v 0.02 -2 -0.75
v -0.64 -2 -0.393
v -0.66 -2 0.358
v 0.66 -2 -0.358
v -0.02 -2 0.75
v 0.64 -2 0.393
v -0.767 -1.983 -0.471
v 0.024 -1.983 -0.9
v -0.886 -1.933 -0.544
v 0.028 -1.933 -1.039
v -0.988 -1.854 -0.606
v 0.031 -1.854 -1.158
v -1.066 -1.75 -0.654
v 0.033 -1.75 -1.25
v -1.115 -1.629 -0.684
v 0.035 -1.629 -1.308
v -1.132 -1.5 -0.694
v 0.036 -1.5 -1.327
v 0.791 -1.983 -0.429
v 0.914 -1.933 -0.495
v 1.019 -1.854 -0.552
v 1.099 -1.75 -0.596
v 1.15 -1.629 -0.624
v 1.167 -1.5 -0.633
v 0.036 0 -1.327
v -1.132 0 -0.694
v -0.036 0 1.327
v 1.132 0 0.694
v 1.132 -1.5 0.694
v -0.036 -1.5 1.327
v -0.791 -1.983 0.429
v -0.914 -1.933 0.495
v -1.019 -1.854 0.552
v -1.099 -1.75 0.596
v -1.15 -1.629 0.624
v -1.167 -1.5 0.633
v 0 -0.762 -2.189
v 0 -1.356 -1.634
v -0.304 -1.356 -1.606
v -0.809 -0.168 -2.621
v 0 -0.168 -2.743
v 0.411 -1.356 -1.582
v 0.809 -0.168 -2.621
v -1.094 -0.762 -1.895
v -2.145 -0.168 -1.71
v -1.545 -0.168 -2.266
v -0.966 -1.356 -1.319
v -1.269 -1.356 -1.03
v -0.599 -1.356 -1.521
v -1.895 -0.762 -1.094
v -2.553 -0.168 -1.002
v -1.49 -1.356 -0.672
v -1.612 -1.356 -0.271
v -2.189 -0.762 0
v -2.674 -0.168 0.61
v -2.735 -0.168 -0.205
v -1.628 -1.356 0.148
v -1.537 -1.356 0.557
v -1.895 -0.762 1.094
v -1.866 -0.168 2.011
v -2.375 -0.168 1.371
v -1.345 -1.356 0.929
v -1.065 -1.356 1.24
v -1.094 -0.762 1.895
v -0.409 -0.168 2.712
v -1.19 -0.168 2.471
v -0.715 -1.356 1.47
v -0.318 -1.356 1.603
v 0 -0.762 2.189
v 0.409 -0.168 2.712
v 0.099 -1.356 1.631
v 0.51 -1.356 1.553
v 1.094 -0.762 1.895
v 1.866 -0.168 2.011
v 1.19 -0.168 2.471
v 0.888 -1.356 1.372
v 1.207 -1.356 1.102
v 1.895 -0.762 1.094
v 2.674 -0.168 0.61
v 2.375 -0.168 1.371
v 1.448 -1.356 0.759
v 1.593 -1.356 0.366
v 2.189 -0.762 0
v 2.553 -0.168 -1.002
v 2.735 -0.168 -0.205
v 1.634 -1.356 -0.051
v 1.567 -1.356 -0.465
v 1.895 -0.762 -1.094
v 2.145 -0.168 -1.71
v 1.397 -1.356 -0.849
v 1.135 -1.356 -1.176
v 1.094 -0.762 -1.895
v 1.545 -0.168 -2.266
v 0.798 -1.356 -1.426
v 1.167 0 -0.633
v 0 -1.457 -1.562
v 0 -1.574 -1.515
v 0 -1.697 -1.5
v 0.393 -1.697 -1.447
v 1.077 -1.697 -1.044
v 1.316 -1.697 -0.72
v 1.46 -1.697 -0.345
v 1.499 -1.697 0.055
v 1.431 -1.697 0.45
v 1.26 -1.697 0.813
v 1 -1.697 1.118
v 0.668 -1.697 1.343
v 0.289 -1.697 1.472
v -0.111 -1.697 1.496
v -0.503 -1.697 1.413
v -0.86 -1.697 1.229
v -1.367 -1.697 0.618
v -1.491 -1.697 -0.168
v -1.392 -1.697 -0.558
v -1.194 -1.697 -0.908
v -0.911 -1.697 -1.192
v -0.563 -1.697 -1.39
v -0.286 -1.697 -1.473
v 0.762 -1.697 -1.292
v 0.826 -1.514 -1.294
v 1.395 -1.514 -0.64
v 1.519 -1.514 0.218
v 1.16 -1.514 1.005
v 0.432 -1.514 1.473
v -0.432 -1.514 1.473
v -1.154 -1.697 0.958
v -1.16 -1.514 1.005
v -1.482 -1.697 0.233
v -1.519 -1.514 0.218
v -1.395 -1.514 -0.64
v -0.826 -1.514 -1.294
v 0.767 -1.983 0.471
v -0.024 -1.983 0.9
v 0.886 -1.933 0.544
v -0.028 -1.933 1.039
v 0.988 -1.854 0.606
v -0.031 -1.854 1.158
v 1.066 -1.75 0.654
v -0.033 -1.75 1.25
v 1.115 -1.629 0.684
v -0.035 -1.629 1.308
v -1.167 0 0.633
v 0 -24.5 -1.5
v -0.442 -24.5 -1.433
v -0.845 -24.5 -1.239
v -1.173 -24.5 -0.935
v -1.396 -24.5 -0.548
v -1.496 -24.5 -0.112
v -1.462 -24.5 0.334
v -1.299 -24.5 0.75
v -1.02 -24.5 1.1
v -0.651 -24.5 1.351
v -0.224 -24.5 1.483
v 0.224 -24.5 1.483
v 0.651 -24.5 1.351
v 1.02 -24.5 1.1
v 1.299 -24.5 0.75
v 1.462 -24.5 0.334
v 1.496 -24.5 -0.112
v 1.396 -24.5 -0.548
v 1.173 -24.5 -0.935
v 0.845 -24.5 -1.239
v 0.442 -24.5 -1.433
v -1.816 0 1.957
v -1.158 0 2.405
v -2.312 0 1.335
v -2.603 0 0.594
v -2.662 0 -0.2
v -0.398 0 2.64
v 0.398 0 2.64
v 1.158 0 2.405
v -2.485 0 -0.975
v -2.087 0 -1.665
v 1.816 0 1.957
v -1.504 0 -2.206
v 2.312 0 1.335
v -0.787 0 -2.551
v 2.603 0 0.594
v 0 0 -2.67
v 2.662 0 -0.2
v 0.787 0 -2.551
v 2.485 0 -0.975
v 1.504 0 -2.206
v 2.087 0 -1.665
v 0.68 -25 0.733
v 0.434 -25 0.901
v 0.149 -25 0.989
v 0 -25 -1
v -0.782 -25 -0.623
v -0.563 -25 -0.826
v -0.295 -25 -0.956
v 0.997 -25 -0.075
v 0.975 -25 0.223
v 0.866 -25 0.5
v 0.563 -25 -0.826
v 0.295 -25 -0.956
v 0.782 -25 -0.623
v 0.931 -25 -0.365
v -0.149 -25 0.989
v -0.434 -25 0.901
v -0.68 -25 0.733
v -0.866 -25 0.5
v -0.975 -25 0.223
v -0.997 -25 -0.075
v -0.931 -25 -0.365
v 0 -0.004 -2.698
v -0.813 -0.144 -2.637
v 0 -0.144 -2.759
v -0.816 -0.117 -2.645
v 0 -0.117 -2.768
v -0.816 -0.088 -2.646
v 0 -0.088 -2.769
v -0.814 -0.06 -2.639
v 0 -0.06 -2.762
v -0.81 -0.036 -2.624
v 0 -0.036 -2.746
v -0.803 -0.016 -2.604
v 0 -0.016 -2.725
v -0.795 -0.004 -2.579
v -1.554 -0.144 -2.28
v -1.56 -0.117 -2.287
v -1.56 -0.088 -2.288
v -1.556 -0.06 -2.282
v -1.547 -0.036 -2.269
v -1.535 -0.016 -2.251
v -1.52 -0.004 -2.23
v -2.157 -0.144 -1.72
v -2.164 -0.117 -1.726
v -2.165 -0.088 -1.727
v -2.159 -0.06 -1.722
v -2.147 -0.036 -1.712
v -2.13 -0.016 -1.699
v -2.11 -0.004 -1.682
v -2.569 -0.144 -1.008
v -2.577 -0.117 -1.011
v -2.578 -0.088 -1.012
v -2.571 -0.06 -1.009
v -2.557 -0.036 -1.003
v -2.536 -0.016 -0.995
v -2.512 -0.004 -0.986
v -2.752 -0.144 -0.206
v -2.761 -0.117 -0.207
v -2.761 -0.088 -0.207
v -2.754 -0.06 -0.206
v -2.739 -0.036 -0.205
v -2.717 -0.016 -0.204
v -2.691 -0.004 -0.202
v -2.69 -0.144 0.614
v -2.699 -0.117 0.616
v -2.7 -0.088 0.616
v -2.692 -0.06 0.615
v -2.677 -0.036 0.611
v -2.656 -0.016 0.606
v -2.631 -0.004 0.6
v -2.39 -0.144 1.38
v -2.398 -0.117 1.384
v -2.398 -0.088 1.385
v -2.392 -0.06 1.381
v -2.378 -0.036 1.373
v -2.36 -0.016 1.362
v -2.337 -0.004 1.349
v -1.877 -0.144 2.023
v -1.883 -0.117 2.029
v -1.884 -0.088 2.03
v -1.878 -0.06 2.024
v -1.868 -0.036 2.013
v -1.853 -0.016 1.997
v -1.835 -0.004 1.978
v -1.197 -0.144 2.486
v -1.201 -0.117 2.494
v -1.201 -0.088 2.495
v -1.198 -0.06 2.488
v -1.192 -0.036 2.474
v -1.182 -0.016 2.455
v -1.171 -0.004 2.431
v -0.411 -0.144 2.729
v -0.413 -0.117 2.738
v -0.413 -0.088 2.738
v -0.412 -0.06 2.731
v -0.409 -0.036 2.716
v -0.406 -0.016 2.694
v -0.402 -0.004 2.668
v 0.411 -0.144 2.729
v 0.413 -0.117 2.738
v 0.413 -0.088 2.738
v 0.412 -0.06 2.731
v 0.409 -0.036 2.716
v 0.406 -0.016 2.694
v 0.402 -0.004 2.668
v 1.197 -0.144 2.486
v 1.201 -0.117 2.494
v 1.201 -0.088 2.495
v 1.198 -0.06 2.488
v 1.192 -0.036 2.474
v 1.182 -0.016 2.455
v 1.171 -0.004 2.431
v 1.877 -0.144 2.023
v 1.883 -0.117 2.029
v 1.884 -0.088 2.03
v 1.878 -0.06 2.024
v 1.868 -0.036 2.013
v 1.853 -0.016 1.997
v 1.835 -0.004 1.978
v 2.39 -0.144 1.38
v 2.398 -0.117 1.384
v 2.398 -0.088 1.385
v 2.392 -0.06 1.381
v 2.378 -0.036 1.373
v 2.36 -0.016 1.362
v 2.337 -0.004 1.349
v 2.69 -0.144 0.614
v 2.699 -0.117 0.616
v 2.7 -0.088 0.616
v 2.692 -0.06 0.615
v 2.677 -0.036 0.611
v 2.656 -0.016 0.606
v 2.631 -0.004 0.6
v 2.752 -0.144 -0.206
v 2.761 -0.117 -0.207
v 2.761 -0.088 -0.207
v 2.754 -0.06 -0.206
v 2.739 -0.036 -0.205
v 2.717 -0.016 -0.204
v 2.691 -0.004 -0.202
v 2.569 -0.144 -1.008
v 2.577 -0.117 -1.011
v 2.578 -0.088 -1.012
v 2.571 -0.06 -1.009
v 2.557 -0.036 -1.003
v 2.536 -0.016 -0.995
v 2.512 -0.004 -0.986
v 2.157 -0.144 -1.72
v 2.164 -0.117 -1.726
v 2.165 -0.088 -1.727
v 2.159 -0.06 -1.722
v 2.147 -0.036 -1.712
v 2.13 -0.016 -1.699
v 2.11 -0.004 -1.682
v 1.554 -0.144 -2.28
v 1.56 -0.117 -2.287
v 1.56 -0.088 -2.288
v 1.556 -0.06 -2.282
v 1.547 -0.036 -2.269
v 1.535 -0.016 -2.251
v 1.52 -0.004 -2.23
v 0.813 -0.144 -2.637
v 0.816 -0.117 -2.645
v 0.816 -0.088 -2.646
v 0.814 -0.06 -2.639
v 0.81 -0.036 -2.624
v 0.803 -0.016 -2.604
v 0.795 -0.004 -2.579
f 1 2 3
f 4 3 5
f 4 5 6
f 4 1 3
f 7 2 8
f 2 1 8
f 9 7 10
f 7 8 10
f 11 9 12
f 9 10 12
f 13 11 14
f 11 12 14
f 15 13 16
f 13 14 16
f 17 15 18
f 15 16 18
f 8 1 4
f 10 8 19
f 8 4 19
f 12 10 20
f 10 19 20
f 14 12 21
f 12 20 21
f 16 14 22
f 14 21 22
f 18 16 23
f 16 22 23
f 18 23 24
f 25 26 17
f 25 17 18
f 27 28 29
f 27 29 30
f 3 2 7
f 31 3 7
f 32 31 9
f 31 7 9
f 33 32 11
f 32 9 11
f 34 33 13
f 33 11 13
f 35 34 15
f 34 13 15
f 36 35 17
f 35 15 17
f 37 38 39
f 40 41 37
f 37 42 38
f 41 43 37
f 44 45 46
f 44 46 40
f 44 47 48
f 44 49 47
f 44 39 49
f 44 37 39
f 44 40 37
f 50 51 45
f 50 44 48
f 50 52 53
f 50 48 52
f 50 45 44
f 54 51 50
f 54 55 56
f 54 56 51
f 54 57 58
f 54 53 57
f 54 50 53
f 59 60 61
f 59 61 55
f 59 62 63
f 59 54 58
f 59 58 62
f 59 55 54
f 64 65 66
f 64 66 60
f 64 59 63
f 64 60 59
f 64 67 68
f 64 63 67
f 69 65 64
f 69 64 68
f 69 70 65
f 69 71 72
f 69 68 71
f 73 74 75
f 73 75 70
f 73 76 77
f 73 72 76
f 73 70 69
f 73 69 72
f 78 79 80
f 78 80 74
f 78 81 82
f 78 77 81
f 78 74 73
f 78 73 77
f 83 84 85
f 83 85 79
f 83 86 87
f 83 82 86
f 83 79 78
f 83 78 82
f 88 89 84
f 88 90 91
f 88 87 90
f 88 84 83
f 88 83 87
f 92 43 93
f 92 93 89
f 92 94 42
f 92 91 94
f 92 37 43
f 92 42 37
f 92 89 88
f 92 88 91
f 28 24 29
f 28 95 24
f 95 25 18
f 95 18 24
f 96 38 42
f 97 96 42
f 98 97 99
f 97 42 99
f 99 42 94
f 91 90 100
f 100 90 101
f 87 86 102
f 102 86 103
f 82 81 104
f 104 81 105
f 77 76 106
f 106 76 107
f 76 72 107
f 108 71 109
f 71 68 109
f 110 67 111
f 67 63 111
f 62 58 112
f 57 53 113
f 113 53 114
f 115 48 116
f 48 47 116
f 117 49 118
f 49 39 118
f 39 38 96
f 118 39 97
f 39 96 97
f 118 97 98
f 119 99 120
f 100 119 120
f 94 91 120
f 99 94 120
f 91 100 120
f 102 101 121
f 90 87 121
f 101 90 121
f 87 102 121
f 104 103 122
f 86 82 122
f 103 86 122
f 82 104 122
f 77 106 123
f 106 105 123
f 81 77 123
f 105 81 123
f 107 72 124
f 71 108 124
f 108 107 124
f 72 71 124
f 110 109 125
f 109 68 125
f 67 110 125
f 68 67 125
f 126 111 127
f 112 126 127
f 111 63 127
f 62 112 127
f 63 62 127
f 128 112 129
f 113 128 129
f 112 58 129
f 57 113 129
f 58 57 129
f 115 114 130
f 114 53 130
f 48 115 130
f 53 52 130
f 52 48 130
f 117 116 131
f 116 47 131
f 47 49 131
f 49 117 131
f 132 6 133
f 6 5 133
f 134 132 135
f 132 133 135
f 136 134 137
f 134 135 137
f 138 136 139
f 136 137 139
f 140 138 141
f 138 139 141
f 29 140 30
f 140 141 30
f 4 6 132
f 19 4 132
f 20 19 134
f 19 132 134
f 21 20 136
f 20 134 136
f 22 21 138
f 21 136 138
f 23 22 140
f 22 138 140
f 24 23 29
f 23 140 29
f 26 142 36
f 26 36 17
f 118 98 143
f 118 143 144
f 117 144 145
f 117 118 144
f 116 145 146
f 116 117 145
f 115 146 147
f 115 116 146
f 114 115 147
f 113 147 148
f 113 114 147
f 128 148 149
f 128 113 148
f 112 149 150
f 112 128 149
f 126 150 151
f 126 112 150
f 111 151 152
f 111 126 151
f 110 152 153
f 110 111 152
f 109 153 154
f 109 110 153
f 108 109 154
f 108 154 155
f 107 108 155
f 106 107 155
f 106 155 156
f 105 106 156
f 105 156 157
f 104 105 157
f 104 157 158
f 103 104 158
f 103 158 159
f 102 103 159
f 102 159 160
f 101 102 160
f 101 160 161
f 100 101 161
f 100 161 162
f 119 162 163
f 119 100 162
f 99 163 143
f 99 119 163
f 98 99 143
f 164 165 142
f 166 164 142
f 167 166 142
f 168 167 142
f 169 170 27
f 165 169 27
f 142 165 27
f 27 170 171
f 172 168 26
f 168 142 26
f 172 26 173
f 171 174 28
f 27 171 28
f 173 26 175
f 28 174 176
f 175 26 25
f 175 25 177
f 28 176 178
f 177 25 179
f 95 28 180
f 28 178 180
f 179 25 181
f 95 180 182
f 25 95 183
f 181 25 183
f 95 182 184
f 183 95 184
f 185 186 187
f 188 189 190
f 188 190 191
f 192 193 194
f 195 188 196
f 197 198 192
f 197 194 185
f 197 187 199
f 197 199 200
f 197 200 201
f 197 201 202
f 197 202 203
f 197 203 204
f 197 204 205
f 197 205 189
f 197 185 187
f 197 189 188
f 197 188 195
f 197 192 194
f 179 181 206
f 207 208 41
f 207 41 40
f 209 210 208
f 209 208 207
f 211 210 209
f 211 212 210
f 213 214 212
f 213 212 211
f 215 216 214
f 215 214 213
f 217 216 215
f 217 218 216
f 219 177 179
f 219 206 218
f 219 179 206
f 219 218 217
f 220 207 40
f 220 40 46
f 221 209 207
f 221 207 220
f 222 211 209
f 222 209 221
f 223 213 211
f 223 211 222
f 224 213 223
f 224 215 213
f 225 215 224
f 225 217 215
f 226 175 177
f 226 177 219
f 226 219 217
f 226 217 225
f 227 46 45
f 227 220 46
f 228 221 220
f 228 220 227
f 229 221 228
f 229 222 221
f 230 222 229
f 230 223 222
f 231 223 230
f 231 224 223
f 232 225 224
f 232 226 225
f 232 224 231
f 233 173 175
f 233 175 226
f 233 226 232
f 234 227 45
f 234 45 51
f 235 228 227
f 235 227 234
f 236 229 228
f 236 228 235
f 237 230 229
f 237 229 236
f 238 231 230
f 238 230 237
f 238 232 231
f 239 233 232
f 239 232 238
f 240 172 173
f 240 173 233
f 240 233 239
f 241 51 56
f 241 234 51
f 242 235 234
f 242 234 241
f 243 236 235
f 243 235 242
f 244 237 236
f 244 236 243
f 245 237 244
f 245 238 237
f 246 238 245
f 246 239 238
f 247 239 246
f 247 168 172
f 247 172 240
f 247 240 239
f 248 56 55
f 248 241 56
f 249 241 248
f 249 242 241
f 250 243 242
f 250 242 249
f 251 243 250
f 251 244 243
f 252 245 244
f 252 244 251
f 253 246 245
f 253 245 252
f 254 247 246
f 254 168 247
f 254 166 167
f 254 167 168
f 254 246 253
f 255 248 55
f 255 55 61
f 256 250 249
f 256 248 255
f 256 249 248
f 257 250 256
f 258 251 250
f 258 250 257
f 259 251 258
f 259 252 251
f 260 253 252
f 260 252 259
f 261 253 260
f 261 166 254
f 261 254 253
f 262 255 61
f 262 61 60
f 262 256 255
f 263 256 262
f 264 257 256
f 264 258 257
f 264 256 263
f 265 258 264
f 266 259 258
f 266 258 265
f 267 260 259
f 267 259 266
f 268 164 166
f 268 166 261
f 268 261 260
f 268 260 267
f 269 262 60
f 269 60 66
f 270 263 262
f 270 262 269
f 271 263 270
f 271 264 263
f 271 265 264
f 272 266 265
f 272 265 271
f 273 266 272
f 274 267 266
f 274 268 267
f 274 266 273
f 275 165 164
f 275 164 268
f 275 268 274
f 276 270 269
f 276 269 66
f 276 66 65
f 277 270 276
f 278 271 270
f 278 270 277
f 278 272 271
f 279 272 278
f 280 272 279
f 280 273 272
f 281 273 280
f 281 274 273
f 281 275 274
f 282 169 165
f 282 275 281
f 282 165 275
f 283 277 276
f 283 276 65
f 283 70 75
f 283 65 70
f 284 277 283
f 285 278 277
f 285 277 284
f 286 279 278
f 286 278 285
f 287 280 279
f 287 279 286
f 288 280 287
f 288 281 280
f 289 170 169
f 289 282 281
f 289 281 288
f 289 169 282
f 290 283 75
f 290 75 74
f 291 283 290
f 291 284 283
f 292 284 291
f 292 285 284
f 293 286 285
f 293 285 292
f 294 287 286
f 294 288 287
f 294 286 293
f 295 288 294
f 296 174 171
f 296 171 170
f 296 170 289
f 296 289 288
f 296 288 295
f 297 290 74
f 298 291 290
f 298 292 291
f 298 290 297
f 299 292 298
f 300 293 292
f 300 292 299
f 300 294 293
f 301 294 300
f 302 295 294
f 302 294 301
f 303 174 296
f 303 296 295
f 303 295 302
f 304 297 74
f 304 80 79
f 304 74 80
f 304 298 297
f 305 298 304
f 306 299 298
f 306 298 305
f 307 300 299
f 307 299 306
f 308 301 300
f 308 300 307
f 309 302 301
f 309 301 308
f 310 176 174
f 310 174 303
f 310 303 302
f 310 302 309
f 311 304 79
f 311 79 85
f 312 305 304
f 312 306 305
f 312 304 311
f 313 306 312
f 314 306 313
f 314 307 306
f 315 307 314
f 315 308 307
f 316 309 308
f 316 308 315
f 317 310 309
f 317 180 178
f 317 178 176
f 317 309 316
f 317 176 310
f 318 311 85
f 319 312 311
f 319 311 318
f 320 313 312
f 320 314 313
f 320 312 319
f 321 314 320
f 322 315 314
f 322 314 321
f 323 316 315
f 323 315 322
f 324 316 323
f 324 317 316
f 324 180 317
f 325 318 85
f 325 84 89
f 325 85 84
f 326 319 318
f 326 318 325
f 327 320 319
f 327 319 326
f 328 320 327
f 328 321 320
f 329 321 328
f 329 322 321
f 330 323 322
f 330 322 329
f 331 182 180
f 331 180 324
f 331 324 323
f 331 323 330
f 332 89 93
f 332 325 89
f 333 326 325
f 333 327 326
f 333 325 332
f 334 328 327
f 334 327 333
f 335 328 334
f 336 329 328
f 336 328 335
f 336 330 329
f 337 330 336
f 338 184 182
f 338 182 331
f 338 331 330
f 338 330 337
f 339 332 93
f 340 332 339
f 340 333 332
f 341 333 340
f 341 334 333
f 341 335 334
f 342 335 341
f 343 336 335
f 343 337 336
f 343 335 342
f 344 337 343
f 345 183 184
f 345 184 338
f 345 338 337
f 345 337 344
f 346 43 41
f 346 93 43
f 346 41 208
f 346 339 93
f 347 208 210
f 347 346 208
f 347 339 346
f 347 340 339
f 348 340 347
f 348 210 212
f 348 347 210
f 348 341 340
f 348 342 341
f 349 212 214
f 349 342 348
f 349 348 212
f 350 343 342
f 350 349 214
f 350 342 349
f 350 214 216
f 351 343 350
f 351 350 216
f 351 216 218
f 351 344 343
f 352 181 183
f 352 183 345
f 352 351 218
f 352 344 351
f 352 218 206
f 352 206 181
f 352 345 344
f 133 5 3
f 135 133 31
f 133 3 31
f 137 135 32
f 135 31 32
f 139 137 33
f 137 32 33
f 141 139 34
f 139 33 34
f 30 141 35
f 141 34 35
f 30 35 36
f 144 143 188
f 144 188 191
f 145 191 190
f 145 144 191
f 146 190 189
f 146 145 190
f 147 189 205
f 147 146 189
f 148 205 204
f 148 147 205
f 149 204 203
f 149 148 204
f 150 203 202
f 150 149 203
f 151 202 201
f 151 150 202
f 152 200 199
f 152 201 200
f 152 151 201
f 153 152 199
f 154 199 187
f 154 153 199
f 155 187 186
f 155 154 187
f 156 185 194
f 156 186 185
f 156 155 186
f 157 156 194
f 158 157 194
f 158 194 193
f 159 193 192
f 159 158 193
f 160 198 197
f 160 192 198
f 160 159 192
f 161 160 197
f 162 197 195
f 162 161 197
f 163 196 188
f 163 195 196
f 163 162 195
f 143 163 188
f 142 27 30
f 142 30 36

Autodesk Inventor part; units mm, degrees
ref_plane "YZ Plane" through (0, 0, 0) normal (1, 0, 0) x (0, 1, 0)
ref_plane "XZ Plane" through (0, 0, 0) normal (0, 1, 0) x (-1, 0, 0)
ref_plane "XY Plane" through (0, 0, 0) normal (0, 0, 1) x (1, 0, 0)
sketch "Szkic2" plane through (0, 0, 0) normal (1, 0, 0) x (0, 1, 0)
  line L0 (0, -2.9) -> (0, 2.9)
  line L1 (-1.5, -1.5) -> (-1.5, 1.5)
  line L2 (-1.5, -1.5) -> (0, -2.9)
  line L3 (-1.5, 1.5) -> (0, 2.9)
  line L4 (0, 0) -> (-25, 0)
  line L5 (-25, 0) -> (-25, -1.5)
  line L6 (-25, -1.5) -> (-1.5, -1.5)
  dimension "d0" = 5.8
  dimension "d2" = 3
  dimension "d3" = 1.5
  dimension "d4" = 25
  dimension "d5" = 1.5
revolve "Obrót1" add sketch "Szkic2" angle 360 about axis through (0, 0, 0) along (0, -1, 0) contours L2 L1 L4 L0 | L6 L5 L4 L1
sketch "Szkic3" plane through (0, 0, 0) normal (0, 1, 0) x (1, 0, 0)
  line L0 (-1.1673, -0.633) -> (-1.1318, 0.6945)
  line L1 (-1.1318, 0.6945) -> (0.0355, 1.3274)
  line L2 (0.0355, 1.3274) -> (1.1673, 0.633)
  line L3 (1.1673, 0.633) -> (1.1318, -0.6945)
  line L4 (1.1318, -0.6945) -> (-0.0355, -1.3274)
  line L5 (-0.0355, -1.3274) -> (-1.1673, -0.633)
  point P0 (0, 0)
  point P1 (0, 0)
  dimension "d7" = 2.3
extrude "Wyciągnięcie proste1" cut sketch "Szkic3" against normal blind 2
fillet "Zaokrąglenie1" radius 0.5 6 edges at (-1.1496, -2, -0.0308) (-0.6014, -2, 0.9802) (-0.5482, -2, -1.011) (0.6014, -2, -0.9802) (0.5482, -2, 1.011) (1.1496, -2, 0.0308)
fillet "Zaokrąglenie2" radius 0.5 1 edges at (0, -1.5, 1.5)
fillet "Zaokrąglenie3" radius 0.1 1 edges at (0, 0, 2.9)
thread "Gwint1" size "M3x0.5" class "6g" standard "ANSI Metric M Profile" full length
chamfer "Faza1" distance 0.5 angle 45 1 edges at (0, -25, 1.5)
properties part number "Screw M3 25mm flat head"
